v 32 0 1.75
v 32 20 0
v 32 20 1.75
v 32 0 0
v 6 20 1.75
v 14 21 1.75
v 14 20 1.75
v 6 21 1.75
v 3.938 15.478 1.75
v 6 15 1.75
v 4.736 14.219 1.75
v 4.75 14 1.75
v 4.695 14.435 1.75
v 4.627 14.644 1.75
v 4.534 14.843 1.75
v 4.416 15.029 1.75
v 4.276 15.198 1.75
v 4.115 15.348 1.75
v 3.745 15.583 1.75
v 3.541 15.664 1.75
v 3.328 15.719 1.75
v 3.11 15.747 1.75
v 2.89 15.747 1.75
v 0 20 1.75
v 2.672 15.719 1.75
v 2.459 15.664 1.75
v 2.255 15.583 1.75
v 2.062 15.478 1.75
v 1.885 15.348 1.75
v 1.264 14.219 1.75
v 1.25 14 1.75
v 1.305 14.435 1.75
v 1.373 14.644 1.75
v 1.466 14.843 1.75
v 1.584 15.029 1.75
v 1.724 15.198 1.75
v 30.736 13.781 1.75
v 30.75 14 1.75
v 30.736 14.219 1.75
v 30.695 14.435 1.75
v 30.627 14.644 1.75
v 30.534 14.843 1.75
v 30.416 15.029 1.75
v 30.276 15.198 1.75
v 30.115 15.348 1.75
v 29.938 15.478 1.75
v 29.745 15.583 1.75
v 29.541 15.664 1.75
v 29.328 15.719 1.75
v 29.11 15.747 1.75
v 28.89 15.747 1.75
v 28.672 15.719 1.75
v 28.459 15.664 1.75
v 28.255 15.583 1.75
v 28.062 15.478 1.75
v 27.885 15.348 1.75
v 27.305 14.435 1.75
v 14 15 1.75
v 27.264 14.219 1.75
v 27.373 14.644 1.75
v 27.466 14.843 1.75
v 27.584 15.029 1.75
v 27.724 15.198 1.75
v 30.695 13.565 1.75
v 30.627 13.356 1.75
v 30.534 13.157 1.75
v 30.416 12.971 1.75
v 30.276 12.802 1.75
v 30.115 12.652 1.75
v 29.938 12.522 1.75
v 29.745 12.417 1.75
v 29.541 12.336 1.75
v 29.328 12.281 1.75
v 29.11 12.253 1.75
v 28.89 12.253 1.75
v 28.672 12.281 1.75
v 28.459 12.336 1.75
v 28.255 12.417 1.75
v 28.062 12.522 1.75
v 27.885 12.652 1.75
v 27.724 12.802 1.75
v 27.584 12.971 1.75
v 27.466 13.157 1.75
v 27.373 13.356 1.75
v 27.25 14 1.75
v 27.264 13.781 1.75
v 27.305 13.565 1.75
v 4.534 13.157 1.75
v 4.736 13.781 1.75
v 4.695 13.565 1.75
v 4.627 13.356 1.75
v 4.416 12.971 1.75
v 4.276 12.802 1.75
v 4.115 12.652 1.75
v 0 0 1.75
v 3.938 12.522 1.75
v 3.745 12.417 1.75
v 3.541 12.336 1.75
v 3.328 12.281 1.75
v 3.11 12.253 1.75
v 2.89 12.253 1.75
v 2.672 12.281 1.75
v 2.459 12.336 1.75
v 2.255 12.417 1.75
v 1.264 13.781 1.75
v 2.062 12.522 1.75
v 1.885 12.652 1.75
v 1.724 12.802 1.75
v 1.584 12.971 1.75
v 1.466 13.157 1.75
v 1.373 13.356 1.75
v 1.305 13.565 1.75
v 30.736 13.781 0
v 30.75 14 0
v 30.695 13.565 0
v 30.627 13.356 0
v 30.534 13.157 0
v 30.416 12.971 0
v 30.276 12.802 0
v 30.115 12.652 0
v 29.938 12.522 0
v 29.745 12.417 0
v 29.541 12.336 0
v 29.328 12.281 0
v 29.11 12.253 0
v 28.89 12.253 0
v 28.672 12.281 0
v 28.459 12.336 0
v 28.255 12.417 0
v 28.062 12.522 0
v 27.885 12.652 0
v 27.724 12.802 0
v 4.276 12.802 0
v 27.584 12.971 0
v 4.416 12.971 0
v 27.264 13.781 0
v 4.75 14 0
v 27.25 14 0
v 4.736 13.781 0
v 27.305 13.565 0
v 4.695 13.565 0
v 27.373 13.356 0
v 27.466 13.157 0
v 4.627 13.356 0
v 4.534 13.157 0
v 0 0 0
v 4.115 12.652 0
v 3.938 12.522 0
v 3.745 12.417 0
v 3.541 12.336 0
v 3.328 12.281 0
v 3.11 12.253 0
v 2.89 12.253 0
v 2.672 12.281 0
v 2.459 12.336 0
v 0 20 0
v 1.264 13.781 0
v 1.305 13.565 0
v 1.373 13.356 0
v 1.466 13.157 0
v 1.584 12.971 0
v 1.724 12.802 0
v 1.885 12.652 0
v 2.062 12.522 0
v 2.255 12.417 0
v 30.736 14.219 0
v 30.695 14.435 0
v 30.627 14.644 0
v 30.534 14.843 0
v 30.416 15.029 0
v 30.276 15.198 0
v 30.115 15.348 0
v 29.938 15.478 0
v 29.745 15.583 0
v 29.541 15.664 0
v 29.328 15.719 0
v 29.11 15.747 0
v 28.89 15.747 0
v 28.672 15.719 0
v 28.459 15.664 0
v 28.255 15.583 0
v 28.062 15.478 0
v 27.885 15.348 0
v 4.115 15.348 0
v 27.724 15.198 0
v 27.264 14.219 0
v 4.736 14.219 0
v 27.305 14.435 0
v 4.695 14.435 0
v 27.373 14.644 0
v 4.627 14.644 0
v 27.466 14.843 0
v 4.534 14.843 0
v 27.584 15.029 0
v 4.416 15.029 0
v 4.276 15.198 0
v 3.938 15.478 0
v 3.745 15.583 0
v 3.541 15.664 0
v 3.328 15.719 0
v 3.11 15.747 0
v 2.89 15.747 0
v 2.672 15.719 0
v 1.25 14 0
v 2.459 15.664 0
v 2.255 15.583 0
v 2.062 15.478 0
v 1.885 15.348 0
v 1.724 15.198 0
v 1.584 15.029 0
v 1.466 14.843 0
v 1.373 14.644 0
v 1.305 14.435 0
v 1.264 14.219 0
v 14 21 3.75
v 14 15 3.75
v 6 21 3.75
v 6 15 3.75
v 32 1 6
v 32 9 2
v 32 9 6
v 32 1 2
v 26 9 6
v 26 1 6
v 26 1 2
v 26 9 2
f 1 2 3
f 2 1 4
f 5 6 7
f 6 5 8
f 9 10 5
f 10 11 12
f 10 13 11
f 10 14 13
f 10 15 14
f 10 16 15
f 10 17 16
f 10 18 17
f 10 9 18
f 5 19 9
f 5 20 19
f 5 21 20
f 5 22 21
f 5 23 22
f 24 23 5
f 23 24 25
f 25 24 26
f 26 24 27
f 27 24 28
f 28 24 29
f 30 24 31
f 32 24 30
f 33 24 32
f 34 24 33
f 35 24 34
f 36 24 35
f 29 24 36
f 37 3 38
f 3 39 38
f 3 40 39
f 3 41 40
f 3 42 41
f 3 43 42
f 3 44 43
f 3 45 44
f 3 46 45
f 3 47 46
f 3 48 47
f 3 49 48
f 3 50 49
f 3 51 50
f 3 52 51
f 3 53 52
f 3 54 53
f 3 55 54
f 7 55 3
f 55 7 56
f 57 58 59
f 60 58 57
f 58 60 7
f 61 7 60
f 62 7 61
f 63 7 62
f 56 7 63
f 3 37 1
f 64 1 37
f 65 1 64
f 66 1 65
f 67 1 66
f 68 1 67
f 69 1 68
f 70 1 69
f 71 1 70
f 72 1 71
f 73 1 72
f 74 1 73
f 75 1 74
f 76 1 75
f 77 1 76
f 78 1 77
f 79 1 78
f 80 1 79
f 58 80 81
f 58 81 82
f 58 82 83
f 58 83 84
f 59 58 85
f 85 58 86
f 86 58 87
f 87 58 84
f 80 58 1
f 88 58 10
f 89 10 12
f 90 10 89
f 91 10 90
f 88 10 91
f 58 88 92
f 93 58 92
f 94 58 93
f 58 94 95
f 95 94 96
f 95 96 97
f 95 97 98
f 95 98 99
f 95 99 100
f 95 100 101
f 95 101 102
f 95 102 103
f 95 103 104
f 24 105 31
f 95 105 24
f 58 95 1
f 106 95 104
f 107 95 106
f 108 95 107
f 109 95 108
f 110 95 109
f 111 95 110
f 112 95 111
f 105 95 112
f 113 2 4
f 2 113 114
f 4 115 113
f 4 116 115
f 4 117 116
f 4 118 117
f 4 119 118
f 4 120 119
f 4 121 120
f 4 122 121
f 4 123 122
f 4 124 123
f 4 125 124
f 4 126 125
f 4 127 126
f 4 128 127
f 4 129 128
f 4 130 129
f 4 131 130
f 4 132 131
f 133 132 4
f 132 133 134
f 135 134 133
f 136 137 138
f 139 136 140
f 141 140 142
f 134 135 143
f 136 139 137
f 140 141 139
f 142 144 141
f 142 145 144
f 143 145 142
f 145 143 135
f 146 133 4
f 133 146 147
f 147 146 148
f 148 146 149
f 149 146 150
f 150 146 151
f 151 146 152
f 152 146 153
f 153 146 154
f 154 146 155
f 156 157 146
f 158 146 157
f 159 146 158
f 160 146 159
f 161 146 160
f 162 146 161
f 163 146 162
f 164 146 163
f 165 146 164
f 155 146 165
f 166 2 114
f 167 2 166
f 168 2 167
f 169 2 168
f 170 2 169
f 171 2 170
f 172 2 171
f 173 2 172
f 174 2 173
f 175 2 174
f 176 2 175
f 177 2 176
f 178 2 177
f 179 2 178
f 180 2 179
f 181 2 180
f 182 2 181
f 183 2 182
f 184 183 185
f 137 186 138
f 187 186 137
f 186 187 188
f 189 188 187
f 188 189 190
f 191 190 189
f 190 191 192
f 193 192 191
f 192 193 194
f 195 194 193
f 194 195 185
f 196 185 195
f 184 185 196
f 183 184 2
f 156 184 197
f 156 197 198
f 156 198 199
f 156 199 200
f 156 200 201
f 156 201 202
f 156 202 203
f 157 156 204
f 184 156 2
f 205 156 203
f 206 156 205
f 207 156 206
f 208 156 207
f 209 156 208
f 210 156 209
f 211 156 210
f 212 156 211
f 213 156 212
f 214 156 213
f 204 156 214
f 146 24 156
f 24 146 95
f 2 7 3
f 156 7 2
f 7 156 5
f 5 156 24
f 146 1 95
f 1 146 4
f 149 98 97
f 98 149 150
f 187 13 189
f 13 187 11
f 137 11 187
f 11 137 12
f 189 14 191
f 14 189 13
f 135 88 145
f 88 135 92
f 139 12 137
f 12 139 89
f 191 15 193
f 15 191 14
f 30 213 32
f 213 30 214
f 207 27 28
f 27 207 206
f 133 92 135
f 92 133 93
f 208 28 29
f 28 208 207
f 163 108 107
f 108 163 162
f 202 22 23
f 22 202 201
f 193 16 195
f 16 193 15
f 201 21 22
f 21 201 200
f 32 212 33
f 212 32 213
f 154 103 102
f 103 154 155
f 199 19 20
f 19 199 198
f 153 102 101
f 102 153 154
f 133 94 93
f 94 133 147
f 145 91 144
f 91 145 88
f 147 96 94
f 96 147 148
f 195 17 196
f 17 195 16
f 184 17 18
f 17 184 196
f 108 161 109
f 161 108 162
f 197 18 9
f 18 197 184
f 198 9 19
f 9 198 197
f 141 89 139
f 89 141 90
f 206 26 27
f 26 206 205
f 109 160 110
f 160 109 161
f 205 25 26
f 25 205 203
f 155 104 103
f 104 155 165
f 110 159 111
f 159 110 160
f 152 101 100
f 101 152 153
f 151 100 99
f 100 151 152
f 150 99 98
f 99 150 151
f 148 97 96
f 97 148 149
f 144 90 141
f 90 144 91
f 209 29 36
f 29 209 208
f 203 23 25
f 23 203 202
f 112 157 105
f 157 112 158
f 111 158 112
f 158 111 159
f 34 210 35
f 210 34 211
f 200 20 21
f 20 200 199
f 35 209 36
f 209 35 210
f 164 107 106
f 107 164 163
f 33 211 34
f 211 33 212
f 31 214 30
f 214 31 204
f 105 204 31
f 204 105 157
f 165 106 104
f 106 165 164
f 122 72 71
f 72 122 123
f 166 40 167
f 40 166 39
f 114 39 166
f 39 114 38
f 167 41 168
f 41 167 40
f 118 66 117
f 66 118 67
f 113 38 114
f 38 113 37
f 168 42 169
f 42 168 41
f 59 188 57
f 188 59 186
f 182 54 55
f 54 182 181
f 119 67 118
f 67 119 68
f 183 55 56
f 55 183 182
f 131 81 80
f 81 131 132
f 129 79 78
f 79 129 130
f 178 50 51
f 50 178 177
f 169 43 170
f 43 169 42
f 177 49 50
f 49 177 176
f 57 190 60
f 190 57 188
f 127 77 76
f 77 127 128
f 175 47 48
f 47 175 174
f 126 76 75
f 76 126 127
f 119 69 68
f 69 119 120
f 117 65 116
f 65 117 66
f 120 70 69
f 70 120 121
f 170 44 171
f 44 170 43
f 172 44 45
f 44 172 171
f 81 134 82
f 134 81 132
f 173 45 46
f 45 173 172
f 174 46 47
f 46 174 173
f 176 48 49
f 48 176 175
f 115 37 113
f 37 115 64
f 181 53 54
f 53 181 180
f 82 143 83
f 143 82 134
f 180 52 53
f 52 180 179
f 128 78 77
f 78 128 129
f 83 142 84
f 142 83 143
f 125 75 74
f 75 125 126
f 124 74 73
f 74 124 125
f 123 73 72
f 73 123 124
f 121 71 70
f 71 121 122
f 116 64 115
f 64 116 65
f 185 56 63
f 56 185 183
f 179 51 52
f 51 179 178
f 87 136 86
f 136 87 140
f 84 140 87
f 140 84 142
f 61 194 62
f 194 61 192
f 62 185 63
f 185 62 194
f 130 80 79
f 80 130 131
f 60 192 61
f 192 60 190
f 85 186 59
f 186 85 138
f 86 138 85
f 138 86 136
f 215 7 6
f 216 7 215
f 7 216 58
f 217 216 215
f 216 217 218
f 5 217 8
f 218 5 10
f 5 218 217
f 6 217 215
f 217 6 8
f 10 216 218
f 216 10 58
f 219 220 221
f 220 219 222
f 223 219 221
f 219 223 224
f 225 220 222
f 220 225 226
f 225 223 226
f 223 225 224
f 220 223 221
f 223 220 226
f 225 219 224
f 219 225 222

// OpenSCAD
// base w/ holes
difference() {
    base_x=32;
    base_y=20;
    base_z=1.75;
    color("red") cube([base_x,base_y,base_z]);
    hole_d=3.5;
    translate([3,14,-1])
        cylinder(d=3.5, h=base_z*2, $fn=50);
    translate([29,14,-1])
        cylinder(d=3.5, h=base_z*2, $fn=50);
}
// USB
translate([6,15,1.75])
    color("silver") cube([8,6,2]);
// JST
translate([26,1,2])
    color([0.2,0.2,0.2]) cube([6,8,4]);
